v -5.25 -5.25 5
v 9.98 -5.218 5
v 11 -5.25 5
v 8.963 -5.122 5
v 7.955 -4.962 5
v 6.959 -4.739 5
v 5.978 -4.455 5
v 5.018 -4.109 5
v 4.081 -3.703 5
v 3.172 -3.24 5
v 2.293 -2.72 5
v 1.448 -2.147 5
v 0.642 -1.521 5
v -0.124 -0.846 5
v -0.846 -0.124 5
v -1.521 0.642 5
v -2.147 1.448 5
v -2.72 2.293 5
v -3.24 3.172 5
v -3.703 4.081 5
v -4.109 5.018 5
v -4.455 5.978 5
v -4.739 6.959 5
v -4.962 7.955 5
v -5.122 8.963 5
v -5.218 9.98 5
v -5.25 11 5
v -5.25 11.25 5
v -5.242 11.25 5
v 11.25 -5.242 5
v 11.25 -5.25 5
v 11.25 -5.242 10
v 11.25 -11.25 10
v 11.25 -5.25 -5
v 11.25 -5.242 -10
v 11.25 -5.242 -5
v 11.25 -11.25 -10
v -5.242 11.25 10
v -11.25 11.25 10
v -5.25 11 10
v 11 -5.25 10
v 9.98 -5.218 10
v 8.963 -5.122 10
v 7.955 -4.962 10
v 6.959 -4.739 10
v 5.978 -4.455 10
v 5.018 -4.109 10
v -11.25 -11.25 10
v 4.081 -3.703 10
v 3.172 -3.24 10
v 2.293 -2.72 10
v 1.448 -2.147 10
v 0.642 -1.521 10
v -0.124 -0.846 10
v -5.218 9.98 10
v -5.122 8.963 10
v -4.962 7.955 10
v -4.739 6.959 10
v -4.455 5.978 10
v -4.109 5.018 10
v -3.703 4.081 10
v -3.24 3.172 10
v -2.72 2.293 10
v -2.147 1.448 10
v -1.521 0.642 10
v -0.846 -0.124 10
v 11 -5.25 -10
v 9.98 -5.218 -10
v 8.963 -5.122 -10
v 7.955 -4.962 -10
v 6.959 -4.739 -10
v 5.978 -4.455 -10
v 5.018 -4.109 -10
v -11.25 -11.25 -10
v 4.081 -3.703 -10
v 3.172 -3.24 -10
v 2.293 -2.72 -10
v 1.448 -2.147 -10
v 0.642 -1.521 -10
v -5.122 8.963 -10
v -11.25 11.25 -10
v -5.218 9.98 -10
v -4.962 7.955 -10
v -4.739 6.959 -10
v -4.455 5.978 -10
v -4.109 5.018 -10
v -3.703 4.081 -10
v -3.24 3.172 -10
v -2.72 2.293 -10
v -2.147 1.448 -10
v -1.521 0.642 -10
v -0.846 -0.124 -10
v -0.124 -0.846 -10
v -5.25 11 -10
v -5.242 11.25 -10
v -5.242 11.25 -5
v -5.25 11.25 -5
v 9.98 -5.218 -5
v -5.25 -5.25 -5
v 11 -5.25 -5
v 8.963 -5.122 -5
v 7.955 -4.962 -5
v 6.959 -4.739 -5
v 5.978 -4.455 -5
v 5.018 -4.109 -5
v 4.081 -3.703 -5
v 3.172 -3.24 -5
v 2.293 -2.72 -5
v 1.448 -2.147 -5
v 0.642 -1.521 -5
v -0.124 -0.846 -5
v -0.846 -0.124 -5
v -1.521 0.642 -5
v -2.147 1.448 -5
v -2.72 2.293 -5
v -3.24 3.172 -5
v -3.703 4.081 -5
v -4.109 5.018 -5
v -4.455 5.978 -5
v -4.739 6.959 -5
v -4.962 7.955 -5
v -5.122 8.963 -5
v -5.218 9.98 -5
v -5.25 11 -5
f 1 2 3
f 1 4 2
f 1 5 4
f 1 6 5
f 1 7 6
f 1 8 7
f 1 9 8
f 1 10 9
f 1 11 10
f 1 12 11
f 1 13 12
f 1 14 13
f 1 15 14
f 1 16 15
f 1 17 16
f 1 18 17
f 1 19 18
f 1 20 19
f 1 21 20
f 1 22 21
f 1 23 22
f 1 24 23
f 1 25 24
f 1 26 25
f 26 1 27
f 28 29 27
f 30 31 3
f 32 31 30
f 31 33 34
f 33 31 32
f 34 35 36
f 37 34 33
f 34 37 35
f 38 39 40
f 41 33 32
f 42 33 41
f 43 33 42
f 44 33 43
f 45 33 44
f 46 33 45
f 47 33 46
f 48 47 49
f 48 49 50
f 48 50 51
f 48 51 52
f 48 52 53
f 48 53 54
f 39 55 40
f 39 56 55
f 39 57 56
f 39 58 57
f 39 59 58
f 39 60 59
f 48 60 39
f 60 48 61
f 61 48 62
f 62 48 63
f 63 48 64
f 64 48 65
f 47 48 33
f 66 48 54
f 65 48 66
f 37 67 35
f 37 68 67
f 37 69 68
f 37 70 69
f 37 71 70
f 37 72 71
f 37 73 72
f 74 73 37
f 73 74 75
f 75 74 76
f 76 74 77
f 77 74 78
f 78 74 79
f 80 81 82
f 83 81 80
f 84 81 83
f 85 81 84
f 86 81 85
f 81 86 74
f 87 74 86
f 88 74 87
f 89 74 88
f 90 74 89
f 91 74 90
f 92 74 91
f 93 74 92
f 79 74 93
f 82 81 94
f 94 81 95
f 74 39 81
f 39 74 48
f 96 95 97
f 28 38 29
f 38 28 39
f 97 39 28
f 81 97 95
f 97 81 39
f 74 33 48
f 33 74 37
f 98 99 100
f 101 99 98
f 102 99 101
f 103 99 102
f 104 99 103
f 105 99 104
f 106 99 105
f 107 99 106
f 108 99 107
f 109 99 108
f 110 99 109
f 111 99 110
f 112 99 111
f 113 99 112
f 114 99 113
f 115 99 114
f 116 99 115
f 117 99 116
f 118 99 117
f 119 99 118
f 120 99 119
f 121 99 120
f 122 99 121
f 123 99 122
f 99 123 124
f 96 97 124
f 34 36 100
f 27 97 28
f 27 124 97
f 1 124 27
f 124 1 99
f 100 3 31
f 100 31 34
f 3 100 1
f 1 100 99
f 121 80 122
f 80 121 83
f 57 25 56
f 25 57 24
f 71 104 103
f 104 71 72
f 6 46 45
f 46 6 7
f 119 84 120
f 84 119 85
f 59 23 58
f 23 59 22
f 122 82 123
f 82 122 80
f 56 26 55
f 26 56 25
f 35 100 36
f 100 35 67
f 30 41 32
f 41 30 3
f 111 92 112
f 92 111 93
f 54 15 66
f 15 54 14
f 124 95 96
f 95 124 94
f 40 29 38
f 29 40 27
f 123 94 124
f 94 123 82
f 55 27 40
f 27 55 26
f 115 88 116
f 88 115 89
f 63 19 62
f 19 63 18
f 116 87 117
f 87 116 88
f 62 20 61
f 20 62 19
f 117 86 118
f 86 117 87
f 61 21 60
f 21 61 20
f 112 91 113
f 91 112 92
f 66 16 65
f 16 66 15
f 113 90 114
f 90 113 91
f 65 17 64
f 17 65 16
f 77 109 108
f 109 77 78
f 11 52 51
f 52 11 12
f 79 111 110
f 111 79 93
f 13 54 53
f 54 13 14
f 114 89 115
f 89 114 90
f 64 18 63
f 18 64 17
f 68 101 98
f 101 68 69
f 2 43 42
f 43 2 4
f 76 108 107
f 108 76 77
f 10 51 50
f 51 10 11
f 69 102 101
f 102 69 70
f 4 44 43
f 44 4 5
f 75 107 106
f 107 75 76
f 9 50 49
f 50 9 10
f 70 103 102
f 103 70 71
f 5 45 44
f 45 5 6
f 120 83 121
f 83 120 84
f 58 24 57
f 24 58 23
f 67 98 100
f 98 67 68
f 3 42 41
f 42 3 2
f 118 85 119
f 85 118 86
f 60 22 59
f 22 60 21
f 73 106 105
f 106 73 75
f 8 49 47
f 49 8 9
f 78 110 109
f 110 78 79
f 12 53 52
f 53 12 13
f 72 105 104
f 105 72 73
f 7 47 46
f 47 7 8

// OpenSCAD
//resoluciOn
$fn=100;

//ancho del perfil 20 [mm]

module perfil1 (){
    //control del espesor del alumnio en las orillas
    medida=2;
difference(){
  square([20,20],center=true);
  circle(r=2);
  for(i=[1:4]){
  rotate(i*90)
  translate([0,-20/2])
  polygon(points=[[0,-medida],[3,-medida],[3,medida],[5,medida],[5,3],[3,5],[-3,5],[-5,3],[-5,medida],[-3,medida],[-3,-medida]]);
   
   //cuadrado detalle para rodamiento balero*
    rotate(i*90)
   translate([0,-20/2])
   square([7,0.7*2],center=true);   
   }
   
   //square([7,0.7*2],center=true)
   
}

}//fin module


module perfil2(){
translate([-10,0,0])
union(){
translate([20,0,0])
perfil1();
perfil1();
}
}

module esquinero(){
difference(){
cube([22.5,22.5,20],center=true);    

translate([6,6,0])
cube([22.5,22.5,10],center=true); 

translate([11,11,0])
cylinder(r=(22.5/2)+5,h=60,$fn=100,center=true);

tornilloMaquina();
}
    
}

module baleroPatineta(){
difference(){
cylinder(r=22/2,h=7,center=true);
cylinder(r=8/2,h=7+2,center=true);
}    
}


module tornillo(altura=40){
    union(){
    cylinder($fn=6,h=6,r=15/2);
    cylinder($fn=100,h=altura,r=8/2);
    }
}


module tornilloMaquina(altura=5){
    union(){
    cylinder($fn=6,h=3,r=8/2);
    cylinder($fn=100,h=altura,r=5/2);
    }
}

module NEMA(){
union(){
  translate([0,0,20])
  cube([42,42,40],center=true);
  cylinder(r=16/2,h=62);
}

}


//####RENDERIZADOS####

esquinero();

/*
linear_extrude(height=400)
perfil1();
*/

/*
linear_extrude(height=300)
perfil2();
*/

//baleroPatineta();

//tornillo();

//NEMA();
